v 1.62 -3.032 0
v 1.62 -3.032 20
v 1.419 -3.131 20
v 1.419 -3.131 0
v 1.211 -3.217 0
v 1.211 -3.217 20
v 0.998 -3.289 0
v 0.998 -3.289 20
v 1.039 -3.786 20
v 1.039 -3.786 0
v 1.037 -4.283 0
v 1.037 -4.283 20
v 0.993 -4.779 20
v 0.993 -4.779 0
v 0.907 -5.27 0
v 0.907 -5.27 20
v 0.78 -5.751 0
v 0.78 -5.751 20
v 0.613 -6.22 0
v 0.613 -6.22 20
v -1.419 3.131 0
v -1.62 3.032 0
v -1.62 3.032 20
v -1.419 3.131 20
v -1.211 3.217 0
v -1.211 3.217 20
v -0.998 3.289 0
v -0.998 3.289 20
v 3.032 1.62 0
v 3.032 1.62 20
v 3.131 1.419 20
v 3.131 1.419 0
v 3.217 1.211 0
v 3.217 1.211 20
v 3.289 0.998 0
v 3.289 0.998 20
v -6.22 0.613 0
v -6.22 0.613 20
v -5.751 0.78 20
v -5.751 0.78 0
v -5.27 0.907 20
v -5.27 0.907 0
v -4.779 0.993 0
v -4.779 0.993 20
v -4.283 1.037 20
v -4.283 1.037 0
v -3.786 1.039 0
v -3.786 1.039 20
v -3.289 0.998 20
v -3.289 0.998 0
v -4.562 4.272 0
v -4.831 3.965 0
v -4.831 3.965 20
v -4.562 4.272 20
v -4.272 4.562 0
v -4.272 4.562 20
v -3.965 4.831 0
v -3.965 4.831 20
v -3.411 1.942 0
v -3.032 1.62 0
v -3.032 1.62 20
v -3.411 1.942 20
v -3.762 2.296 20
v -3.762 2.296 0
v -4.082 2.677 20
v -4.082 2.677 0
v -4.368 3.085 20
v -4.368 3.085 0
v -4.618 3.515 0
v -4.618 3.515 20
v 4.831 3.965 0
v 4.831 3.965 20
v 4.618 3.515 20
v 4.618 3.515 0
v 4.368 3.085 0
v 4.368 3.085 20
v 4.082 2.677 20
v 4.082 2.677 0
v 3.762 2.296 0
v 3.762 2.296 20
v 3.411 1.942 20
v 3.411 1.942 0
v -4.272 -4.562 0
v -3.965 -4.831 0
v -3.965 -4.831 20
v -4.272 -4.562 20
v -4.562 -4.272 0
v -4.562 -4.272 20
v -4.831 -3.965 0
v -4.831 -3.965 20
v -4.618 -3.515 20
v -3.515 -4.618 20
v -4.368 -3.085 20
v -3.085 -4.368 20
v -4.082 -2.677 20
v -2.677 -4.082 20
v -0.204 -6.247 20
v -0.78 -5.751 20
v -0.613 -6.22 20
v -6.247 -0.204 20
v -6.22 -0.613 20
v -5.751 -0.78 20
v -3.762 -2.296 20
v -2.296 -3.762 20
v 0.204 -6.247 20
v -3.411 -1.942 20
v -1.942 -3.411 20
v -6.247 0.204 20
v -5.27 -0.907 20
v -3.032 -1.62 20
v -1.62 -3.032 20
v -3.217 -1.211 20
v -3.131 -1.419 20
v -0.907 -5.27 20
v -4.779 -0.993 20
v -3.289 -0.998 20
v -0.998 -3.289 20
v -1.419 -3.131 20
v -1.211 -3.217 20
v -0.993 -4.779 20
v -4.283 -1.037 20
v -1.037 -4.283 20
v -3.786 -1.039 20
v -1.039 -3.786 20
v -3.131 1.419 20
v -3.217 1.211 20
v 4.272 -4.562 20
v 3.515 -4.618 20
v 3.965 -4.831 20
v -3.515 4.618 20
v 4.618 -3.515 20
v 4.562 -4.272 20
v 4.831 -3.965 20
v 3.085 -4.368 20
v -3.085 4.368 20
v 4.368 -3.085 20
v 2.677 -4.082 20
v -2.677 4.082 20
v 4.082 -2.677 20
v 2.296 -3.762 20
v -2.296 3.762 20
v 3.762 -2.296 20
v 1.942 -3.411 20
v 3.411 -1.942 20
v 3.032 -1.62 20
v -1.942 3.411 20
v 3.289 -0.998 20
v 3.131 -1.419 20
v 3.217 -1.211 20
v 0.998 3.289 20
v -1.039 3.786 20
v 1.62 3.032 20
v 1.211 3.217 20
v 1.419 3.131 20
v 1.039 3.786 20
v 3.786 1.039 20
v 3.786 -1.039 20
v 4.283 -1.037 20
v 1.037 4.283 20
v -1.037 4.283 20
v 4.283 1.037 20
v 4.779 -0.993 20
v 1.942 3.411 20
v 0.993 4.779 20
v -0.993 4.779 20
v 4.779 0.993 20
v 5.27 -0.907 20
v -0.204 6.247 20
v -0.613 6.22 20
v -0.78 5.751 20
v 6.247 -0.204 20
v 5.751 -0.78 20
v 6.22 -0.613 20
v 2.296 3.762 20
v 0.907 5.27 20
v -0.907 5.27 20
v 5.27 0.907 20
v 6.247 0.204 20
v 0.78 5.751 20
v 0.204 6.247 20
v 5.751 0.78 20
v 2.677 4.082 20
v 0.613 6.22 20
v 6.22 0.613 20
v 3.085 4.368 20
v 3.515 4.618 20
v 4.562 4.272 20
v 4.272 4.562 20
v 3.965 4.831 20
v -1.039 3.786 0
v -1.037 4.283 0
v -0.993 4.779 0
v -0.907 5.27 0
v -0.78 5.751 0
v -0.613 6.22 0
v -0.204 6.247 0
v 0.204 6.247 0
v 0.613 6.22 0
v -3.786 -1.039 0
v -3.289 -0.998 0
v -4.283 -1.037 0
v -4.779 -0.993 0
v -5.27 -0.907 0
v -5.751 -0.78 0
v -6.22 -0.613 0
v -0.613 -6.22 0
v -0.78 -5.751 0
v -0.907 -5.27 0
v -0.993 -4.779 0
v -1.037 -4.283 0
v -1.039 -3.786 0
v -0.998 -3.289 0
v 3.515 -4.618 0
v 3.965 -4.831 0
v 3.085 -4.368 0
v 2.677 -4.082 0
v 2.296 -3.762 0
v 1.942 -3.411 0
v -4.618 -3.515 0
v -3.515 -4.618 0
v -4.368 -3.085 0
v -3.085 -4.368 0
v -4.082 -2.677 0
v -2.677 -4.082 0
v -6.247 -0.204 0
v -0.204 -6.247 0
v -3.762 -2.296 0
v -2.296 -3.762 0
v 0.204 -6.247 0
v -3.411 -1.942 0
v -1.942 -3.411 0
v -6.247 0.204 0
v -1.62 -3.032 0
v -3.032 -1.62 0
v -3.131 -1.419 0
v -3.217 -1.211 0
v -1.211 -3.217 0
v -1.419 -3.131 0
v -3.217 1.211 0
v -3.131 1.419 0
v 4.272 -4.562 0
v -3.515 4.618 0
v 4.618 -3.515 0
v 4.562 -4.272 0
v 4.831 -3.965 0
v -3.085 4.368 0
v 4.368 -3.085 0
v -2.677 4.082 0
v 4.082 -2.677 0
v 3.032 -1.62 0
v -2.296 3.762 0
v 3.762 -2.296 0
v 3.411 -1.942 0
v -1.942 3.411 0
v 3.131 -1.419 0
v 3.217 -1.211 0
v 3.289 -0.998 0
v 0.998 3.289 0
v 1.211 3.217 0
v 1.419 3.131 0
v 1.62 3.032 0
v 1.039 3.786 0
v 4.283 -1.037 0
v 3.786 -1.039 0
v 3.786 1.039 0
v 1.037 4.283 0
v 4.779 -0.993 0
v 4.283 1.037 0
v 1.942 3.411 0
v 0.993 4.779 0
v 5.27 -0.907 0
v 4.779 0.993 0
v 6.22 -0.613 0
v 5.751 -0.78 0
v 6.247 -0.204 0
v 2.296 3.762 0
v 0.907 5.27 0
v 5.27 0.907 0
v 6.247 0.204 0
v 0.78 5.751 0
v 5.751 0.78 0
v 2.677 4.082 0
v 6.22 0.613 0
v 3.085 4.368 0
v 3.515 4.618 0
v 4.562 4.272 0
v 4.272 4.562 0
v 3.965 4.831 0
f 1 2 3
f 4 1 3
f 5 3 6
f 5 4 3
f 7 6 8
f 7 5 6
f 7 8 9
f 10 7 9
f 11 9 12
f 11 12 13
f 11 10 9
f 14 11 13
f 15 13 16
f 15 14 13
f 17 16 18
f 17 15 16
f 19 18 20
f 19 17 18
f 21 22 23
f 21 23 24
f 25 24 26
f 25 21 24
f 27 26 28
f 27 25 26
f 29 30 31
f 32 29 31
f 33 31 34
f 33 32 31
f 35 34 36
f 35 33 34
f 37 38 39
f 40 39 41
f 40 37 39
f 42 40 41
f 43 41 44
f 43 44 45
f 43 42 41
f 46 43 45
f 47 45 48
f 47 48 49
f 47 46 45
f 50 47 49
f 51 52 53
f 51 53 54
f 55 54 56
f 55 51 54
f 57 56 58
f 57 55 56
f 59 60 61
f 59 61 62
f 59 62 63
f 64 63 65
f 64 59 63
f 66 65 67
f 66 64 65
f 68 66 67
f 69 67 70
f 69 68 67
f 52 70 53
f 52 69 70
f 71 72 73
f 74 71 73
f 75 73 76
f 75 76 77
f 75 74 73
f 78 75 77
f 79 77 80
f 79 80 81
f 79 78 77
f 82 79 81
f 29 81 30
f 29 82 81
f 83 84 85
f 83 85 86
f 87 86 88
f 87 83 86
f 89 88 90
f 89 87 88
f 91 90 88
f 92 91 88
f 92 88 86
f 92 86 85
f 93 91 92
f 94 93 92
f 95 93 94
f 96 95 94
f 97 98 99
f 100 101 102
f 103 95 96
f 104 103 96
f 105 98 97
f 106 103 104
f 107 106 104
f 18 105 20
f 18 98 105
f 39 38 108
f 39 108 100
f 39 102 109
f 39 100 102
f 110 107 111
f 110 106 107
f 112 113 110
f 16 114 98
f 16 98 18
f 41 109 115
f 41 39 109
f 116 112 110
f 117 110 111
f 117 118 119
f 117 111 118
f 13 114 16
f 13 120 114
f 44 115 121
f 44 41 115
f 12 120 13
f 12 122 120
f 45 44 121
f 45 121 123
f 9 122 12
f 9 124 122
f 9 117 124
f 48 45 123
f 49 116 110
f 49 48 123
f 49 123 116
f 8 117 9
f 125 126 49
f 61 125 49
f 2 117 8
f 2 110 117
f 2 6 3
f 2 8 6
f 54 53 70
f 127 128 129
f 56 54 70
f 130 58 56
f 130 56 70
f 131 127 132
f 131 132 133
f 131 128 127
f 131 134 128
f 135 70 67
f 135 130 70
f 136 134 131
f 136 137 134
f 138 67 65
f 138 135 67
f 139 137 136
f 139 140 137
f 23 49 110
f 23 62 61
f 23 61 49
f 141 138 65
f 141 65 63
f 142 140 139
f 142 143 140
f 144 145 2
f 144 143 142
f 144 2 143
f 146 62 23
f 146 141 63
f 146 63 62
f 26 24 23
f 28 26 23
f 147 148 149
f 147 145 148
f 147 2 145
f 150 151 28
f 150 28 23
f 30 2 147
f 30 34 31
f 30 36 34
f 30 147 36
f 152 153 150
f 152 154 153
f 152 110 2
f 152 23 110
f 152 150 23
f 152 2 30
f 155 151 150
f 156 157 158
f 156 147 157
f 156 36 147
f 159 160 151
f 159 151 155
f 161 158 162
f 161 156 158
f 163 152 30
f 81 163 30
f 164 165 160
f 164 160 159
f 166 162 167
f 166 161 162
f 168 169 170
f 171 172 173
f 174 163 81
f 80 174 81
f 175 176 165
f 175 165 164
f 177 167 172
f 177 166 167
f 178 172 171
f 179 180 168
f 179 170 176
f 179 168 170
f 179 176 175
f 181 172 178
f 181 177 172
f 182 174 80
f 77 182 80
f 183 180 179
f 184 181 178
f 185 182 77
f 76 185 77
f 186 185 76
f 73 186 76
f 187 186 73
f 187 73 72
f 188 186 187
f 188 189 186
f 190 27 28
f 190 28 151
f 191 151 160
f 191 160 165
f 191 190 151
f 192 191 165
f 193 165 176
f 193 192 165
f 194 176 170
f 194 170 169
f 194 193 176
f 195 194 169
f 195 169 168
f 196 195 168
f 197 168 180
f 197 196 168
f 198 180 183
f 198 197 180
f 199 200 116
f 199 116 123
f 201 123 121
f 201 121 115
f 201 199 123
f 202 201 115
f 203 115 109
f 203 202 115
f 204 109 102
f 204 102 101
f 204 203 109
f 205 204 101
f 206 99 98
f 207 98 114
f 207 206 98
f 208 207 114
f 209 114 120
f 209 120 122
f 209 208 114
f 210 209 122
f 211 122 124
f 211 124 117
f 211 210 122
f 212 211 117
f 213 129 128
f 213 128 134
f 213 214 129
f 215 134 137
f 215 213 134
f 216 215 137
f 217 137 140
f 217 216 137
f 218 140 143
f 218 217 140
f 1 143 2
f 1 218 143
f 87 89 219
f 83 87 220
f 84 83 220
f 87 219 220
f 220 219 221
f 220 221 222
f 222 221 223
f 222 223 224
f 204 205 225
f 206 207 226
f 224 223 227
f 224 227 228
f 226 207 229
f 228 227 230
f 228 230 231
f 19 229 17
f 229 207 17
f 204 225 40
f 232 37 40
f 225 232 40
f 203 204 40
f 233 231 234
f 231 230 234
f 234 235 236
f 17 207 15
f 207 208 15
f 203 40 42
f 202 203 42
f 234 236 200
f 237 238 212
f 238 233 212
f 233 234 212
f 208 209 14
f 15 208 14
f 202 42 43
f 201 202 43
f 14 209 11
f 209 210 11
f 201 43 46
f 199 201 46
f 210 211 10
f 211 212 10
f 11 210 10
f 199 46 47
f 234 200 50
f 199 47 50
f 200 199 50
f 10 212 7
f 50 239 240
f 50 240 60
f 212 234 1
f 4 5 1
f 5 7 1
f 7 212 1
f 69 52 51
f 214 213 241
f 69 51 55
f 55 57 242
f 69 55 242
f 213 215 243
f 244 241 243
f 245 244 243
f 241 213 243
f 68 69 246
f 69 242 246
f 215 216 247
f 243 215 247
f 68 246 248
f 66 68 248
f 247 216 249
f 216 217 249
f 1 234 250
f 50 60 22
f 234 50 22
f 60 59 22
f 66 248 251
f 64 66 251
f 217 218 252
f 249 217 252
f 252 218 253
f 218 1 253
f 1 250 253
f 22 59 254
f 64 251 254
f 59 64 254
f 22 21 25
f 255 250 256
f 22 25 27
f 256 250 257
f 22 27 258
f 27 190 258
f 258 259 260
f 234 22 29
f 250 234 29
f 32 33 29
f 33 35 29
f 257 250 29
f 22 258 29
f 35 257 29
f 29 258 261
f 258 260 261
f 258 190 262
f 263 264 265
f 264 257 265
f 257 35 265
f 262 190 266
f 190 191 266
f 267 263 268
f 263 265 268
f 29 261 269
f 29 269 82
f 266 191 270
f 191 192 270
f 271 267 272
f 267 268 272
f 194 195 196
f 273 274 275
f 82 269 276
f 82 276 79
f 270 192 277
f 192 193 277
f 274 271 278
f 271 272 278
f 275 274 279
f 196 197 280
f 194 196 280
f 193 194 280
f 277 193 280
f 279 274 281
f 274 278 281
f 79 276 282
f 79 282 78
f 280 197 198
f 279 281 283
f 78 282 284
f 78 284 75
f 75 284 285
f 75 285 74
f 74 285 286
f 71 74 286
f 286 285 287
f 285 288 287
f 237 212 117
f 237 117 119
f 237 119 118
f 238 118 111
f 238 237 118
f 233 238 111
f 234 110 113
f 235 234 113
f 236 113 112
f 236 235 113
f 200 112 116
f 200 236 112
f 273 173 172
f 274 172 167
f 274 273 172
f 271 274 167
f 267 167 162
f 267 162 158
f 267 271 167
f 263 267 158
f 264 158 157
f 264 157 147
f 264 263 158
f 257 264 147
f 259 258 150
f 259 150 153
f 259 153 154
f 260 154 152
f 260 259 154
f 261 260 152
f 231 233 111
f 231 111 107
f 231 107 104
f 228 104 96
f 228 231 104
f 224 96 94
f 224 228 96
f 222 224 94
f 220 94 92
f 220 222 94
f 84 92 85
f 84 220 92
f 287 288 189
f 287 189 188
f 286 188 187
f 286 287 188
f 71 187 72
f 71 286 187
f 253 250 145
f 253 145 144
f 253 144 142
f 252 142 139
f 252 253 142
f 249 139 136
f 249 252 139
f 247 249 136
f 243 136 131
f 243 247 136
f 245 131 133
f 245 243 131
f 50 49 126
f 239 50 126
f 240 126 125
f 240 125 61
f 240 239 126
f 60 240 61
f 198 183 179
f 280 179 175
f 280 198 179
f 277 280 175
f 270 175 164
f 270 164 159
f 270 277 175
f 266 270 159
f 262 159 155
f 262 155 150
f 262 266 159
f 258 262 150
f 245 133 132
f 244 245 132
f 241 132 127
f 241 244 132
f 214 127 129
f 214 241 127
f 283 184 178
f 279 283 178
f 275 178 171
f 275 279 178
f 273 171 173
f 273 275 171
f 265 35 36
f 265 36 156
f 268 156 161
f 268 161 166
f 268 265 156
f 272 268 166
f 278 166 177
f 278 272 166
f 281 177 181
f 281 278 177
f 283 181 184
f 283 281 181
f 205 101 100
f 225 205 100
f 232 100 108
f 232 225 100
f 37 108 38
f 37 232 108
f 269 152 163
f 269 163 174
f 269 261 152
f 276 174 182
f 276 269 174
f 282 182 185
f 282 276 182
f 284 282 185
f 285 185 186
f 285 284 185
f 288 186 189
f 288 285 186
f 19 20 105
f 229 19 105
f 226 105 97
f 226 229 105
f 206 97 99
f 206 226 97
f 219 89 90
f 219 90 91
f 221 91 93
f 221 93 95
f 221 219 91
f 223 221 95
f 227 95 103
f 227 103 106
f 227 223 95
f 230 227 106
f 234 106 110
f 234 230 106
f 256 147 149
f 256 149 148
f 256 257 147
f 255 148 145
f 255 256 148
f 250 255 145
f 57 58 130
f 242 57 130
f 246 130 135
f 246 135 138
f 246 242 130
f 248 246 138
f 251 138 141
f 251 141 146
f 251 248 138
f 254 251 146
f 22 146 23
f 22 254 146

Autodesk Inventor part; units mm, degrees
sketch "Sketch1" plane through (0, 0, 0) normal (0, 0, 1) x (1, 0, 0)
  circle A0 centre (0, 0) radius 6.25
  dimension "d0" = 12.5
extrude "Extrusion1" add sketch "Sketch1" along normal blind 20
ref_plane "Work Plane2" through (0, 0, 10) normal (0, 0, 1) x (1, 0, 0)
sketch "Sketch2" plane through (0, 0, 0) normal (0, 0, -1) x (-1, 0, 0)
  circle A0 centre (0, 0) radius 6.25 projected
  circle A1 centre (0, 0) radius 5
  dimension "d3" = 10
surface extrude "Pitch Diameter" sketch "Sketch2" against normal through all shown no curves A1
ref_plane "Work Plane8" through (0, 0, 0) normal (0.9238795, 0.3826834, 0) x (0, 0, 1)
ref_plane "Work Plane9" through (0, 0, 0) normal (1, 0, 0) x (0, 1, 0)
spur gear teeth "Spur Gear" teeth 8 pitch diameter 10 tip diameter 12.5 root diameter 6.875 face width 20 start plane through (0, 0, 0) normal (0, 0, -1) x (-1, 0, 0)
equation "\"d0\" = da_da"
equation "\"d1\" = da_b"
equation "\"d3\" = da_d"
equation "\"da_da\" = 12.5"
equation "\"da_b\" = 20"
equation "\"da_d\" = 10"
properties part number "Spur Gear1" material "Steel"
